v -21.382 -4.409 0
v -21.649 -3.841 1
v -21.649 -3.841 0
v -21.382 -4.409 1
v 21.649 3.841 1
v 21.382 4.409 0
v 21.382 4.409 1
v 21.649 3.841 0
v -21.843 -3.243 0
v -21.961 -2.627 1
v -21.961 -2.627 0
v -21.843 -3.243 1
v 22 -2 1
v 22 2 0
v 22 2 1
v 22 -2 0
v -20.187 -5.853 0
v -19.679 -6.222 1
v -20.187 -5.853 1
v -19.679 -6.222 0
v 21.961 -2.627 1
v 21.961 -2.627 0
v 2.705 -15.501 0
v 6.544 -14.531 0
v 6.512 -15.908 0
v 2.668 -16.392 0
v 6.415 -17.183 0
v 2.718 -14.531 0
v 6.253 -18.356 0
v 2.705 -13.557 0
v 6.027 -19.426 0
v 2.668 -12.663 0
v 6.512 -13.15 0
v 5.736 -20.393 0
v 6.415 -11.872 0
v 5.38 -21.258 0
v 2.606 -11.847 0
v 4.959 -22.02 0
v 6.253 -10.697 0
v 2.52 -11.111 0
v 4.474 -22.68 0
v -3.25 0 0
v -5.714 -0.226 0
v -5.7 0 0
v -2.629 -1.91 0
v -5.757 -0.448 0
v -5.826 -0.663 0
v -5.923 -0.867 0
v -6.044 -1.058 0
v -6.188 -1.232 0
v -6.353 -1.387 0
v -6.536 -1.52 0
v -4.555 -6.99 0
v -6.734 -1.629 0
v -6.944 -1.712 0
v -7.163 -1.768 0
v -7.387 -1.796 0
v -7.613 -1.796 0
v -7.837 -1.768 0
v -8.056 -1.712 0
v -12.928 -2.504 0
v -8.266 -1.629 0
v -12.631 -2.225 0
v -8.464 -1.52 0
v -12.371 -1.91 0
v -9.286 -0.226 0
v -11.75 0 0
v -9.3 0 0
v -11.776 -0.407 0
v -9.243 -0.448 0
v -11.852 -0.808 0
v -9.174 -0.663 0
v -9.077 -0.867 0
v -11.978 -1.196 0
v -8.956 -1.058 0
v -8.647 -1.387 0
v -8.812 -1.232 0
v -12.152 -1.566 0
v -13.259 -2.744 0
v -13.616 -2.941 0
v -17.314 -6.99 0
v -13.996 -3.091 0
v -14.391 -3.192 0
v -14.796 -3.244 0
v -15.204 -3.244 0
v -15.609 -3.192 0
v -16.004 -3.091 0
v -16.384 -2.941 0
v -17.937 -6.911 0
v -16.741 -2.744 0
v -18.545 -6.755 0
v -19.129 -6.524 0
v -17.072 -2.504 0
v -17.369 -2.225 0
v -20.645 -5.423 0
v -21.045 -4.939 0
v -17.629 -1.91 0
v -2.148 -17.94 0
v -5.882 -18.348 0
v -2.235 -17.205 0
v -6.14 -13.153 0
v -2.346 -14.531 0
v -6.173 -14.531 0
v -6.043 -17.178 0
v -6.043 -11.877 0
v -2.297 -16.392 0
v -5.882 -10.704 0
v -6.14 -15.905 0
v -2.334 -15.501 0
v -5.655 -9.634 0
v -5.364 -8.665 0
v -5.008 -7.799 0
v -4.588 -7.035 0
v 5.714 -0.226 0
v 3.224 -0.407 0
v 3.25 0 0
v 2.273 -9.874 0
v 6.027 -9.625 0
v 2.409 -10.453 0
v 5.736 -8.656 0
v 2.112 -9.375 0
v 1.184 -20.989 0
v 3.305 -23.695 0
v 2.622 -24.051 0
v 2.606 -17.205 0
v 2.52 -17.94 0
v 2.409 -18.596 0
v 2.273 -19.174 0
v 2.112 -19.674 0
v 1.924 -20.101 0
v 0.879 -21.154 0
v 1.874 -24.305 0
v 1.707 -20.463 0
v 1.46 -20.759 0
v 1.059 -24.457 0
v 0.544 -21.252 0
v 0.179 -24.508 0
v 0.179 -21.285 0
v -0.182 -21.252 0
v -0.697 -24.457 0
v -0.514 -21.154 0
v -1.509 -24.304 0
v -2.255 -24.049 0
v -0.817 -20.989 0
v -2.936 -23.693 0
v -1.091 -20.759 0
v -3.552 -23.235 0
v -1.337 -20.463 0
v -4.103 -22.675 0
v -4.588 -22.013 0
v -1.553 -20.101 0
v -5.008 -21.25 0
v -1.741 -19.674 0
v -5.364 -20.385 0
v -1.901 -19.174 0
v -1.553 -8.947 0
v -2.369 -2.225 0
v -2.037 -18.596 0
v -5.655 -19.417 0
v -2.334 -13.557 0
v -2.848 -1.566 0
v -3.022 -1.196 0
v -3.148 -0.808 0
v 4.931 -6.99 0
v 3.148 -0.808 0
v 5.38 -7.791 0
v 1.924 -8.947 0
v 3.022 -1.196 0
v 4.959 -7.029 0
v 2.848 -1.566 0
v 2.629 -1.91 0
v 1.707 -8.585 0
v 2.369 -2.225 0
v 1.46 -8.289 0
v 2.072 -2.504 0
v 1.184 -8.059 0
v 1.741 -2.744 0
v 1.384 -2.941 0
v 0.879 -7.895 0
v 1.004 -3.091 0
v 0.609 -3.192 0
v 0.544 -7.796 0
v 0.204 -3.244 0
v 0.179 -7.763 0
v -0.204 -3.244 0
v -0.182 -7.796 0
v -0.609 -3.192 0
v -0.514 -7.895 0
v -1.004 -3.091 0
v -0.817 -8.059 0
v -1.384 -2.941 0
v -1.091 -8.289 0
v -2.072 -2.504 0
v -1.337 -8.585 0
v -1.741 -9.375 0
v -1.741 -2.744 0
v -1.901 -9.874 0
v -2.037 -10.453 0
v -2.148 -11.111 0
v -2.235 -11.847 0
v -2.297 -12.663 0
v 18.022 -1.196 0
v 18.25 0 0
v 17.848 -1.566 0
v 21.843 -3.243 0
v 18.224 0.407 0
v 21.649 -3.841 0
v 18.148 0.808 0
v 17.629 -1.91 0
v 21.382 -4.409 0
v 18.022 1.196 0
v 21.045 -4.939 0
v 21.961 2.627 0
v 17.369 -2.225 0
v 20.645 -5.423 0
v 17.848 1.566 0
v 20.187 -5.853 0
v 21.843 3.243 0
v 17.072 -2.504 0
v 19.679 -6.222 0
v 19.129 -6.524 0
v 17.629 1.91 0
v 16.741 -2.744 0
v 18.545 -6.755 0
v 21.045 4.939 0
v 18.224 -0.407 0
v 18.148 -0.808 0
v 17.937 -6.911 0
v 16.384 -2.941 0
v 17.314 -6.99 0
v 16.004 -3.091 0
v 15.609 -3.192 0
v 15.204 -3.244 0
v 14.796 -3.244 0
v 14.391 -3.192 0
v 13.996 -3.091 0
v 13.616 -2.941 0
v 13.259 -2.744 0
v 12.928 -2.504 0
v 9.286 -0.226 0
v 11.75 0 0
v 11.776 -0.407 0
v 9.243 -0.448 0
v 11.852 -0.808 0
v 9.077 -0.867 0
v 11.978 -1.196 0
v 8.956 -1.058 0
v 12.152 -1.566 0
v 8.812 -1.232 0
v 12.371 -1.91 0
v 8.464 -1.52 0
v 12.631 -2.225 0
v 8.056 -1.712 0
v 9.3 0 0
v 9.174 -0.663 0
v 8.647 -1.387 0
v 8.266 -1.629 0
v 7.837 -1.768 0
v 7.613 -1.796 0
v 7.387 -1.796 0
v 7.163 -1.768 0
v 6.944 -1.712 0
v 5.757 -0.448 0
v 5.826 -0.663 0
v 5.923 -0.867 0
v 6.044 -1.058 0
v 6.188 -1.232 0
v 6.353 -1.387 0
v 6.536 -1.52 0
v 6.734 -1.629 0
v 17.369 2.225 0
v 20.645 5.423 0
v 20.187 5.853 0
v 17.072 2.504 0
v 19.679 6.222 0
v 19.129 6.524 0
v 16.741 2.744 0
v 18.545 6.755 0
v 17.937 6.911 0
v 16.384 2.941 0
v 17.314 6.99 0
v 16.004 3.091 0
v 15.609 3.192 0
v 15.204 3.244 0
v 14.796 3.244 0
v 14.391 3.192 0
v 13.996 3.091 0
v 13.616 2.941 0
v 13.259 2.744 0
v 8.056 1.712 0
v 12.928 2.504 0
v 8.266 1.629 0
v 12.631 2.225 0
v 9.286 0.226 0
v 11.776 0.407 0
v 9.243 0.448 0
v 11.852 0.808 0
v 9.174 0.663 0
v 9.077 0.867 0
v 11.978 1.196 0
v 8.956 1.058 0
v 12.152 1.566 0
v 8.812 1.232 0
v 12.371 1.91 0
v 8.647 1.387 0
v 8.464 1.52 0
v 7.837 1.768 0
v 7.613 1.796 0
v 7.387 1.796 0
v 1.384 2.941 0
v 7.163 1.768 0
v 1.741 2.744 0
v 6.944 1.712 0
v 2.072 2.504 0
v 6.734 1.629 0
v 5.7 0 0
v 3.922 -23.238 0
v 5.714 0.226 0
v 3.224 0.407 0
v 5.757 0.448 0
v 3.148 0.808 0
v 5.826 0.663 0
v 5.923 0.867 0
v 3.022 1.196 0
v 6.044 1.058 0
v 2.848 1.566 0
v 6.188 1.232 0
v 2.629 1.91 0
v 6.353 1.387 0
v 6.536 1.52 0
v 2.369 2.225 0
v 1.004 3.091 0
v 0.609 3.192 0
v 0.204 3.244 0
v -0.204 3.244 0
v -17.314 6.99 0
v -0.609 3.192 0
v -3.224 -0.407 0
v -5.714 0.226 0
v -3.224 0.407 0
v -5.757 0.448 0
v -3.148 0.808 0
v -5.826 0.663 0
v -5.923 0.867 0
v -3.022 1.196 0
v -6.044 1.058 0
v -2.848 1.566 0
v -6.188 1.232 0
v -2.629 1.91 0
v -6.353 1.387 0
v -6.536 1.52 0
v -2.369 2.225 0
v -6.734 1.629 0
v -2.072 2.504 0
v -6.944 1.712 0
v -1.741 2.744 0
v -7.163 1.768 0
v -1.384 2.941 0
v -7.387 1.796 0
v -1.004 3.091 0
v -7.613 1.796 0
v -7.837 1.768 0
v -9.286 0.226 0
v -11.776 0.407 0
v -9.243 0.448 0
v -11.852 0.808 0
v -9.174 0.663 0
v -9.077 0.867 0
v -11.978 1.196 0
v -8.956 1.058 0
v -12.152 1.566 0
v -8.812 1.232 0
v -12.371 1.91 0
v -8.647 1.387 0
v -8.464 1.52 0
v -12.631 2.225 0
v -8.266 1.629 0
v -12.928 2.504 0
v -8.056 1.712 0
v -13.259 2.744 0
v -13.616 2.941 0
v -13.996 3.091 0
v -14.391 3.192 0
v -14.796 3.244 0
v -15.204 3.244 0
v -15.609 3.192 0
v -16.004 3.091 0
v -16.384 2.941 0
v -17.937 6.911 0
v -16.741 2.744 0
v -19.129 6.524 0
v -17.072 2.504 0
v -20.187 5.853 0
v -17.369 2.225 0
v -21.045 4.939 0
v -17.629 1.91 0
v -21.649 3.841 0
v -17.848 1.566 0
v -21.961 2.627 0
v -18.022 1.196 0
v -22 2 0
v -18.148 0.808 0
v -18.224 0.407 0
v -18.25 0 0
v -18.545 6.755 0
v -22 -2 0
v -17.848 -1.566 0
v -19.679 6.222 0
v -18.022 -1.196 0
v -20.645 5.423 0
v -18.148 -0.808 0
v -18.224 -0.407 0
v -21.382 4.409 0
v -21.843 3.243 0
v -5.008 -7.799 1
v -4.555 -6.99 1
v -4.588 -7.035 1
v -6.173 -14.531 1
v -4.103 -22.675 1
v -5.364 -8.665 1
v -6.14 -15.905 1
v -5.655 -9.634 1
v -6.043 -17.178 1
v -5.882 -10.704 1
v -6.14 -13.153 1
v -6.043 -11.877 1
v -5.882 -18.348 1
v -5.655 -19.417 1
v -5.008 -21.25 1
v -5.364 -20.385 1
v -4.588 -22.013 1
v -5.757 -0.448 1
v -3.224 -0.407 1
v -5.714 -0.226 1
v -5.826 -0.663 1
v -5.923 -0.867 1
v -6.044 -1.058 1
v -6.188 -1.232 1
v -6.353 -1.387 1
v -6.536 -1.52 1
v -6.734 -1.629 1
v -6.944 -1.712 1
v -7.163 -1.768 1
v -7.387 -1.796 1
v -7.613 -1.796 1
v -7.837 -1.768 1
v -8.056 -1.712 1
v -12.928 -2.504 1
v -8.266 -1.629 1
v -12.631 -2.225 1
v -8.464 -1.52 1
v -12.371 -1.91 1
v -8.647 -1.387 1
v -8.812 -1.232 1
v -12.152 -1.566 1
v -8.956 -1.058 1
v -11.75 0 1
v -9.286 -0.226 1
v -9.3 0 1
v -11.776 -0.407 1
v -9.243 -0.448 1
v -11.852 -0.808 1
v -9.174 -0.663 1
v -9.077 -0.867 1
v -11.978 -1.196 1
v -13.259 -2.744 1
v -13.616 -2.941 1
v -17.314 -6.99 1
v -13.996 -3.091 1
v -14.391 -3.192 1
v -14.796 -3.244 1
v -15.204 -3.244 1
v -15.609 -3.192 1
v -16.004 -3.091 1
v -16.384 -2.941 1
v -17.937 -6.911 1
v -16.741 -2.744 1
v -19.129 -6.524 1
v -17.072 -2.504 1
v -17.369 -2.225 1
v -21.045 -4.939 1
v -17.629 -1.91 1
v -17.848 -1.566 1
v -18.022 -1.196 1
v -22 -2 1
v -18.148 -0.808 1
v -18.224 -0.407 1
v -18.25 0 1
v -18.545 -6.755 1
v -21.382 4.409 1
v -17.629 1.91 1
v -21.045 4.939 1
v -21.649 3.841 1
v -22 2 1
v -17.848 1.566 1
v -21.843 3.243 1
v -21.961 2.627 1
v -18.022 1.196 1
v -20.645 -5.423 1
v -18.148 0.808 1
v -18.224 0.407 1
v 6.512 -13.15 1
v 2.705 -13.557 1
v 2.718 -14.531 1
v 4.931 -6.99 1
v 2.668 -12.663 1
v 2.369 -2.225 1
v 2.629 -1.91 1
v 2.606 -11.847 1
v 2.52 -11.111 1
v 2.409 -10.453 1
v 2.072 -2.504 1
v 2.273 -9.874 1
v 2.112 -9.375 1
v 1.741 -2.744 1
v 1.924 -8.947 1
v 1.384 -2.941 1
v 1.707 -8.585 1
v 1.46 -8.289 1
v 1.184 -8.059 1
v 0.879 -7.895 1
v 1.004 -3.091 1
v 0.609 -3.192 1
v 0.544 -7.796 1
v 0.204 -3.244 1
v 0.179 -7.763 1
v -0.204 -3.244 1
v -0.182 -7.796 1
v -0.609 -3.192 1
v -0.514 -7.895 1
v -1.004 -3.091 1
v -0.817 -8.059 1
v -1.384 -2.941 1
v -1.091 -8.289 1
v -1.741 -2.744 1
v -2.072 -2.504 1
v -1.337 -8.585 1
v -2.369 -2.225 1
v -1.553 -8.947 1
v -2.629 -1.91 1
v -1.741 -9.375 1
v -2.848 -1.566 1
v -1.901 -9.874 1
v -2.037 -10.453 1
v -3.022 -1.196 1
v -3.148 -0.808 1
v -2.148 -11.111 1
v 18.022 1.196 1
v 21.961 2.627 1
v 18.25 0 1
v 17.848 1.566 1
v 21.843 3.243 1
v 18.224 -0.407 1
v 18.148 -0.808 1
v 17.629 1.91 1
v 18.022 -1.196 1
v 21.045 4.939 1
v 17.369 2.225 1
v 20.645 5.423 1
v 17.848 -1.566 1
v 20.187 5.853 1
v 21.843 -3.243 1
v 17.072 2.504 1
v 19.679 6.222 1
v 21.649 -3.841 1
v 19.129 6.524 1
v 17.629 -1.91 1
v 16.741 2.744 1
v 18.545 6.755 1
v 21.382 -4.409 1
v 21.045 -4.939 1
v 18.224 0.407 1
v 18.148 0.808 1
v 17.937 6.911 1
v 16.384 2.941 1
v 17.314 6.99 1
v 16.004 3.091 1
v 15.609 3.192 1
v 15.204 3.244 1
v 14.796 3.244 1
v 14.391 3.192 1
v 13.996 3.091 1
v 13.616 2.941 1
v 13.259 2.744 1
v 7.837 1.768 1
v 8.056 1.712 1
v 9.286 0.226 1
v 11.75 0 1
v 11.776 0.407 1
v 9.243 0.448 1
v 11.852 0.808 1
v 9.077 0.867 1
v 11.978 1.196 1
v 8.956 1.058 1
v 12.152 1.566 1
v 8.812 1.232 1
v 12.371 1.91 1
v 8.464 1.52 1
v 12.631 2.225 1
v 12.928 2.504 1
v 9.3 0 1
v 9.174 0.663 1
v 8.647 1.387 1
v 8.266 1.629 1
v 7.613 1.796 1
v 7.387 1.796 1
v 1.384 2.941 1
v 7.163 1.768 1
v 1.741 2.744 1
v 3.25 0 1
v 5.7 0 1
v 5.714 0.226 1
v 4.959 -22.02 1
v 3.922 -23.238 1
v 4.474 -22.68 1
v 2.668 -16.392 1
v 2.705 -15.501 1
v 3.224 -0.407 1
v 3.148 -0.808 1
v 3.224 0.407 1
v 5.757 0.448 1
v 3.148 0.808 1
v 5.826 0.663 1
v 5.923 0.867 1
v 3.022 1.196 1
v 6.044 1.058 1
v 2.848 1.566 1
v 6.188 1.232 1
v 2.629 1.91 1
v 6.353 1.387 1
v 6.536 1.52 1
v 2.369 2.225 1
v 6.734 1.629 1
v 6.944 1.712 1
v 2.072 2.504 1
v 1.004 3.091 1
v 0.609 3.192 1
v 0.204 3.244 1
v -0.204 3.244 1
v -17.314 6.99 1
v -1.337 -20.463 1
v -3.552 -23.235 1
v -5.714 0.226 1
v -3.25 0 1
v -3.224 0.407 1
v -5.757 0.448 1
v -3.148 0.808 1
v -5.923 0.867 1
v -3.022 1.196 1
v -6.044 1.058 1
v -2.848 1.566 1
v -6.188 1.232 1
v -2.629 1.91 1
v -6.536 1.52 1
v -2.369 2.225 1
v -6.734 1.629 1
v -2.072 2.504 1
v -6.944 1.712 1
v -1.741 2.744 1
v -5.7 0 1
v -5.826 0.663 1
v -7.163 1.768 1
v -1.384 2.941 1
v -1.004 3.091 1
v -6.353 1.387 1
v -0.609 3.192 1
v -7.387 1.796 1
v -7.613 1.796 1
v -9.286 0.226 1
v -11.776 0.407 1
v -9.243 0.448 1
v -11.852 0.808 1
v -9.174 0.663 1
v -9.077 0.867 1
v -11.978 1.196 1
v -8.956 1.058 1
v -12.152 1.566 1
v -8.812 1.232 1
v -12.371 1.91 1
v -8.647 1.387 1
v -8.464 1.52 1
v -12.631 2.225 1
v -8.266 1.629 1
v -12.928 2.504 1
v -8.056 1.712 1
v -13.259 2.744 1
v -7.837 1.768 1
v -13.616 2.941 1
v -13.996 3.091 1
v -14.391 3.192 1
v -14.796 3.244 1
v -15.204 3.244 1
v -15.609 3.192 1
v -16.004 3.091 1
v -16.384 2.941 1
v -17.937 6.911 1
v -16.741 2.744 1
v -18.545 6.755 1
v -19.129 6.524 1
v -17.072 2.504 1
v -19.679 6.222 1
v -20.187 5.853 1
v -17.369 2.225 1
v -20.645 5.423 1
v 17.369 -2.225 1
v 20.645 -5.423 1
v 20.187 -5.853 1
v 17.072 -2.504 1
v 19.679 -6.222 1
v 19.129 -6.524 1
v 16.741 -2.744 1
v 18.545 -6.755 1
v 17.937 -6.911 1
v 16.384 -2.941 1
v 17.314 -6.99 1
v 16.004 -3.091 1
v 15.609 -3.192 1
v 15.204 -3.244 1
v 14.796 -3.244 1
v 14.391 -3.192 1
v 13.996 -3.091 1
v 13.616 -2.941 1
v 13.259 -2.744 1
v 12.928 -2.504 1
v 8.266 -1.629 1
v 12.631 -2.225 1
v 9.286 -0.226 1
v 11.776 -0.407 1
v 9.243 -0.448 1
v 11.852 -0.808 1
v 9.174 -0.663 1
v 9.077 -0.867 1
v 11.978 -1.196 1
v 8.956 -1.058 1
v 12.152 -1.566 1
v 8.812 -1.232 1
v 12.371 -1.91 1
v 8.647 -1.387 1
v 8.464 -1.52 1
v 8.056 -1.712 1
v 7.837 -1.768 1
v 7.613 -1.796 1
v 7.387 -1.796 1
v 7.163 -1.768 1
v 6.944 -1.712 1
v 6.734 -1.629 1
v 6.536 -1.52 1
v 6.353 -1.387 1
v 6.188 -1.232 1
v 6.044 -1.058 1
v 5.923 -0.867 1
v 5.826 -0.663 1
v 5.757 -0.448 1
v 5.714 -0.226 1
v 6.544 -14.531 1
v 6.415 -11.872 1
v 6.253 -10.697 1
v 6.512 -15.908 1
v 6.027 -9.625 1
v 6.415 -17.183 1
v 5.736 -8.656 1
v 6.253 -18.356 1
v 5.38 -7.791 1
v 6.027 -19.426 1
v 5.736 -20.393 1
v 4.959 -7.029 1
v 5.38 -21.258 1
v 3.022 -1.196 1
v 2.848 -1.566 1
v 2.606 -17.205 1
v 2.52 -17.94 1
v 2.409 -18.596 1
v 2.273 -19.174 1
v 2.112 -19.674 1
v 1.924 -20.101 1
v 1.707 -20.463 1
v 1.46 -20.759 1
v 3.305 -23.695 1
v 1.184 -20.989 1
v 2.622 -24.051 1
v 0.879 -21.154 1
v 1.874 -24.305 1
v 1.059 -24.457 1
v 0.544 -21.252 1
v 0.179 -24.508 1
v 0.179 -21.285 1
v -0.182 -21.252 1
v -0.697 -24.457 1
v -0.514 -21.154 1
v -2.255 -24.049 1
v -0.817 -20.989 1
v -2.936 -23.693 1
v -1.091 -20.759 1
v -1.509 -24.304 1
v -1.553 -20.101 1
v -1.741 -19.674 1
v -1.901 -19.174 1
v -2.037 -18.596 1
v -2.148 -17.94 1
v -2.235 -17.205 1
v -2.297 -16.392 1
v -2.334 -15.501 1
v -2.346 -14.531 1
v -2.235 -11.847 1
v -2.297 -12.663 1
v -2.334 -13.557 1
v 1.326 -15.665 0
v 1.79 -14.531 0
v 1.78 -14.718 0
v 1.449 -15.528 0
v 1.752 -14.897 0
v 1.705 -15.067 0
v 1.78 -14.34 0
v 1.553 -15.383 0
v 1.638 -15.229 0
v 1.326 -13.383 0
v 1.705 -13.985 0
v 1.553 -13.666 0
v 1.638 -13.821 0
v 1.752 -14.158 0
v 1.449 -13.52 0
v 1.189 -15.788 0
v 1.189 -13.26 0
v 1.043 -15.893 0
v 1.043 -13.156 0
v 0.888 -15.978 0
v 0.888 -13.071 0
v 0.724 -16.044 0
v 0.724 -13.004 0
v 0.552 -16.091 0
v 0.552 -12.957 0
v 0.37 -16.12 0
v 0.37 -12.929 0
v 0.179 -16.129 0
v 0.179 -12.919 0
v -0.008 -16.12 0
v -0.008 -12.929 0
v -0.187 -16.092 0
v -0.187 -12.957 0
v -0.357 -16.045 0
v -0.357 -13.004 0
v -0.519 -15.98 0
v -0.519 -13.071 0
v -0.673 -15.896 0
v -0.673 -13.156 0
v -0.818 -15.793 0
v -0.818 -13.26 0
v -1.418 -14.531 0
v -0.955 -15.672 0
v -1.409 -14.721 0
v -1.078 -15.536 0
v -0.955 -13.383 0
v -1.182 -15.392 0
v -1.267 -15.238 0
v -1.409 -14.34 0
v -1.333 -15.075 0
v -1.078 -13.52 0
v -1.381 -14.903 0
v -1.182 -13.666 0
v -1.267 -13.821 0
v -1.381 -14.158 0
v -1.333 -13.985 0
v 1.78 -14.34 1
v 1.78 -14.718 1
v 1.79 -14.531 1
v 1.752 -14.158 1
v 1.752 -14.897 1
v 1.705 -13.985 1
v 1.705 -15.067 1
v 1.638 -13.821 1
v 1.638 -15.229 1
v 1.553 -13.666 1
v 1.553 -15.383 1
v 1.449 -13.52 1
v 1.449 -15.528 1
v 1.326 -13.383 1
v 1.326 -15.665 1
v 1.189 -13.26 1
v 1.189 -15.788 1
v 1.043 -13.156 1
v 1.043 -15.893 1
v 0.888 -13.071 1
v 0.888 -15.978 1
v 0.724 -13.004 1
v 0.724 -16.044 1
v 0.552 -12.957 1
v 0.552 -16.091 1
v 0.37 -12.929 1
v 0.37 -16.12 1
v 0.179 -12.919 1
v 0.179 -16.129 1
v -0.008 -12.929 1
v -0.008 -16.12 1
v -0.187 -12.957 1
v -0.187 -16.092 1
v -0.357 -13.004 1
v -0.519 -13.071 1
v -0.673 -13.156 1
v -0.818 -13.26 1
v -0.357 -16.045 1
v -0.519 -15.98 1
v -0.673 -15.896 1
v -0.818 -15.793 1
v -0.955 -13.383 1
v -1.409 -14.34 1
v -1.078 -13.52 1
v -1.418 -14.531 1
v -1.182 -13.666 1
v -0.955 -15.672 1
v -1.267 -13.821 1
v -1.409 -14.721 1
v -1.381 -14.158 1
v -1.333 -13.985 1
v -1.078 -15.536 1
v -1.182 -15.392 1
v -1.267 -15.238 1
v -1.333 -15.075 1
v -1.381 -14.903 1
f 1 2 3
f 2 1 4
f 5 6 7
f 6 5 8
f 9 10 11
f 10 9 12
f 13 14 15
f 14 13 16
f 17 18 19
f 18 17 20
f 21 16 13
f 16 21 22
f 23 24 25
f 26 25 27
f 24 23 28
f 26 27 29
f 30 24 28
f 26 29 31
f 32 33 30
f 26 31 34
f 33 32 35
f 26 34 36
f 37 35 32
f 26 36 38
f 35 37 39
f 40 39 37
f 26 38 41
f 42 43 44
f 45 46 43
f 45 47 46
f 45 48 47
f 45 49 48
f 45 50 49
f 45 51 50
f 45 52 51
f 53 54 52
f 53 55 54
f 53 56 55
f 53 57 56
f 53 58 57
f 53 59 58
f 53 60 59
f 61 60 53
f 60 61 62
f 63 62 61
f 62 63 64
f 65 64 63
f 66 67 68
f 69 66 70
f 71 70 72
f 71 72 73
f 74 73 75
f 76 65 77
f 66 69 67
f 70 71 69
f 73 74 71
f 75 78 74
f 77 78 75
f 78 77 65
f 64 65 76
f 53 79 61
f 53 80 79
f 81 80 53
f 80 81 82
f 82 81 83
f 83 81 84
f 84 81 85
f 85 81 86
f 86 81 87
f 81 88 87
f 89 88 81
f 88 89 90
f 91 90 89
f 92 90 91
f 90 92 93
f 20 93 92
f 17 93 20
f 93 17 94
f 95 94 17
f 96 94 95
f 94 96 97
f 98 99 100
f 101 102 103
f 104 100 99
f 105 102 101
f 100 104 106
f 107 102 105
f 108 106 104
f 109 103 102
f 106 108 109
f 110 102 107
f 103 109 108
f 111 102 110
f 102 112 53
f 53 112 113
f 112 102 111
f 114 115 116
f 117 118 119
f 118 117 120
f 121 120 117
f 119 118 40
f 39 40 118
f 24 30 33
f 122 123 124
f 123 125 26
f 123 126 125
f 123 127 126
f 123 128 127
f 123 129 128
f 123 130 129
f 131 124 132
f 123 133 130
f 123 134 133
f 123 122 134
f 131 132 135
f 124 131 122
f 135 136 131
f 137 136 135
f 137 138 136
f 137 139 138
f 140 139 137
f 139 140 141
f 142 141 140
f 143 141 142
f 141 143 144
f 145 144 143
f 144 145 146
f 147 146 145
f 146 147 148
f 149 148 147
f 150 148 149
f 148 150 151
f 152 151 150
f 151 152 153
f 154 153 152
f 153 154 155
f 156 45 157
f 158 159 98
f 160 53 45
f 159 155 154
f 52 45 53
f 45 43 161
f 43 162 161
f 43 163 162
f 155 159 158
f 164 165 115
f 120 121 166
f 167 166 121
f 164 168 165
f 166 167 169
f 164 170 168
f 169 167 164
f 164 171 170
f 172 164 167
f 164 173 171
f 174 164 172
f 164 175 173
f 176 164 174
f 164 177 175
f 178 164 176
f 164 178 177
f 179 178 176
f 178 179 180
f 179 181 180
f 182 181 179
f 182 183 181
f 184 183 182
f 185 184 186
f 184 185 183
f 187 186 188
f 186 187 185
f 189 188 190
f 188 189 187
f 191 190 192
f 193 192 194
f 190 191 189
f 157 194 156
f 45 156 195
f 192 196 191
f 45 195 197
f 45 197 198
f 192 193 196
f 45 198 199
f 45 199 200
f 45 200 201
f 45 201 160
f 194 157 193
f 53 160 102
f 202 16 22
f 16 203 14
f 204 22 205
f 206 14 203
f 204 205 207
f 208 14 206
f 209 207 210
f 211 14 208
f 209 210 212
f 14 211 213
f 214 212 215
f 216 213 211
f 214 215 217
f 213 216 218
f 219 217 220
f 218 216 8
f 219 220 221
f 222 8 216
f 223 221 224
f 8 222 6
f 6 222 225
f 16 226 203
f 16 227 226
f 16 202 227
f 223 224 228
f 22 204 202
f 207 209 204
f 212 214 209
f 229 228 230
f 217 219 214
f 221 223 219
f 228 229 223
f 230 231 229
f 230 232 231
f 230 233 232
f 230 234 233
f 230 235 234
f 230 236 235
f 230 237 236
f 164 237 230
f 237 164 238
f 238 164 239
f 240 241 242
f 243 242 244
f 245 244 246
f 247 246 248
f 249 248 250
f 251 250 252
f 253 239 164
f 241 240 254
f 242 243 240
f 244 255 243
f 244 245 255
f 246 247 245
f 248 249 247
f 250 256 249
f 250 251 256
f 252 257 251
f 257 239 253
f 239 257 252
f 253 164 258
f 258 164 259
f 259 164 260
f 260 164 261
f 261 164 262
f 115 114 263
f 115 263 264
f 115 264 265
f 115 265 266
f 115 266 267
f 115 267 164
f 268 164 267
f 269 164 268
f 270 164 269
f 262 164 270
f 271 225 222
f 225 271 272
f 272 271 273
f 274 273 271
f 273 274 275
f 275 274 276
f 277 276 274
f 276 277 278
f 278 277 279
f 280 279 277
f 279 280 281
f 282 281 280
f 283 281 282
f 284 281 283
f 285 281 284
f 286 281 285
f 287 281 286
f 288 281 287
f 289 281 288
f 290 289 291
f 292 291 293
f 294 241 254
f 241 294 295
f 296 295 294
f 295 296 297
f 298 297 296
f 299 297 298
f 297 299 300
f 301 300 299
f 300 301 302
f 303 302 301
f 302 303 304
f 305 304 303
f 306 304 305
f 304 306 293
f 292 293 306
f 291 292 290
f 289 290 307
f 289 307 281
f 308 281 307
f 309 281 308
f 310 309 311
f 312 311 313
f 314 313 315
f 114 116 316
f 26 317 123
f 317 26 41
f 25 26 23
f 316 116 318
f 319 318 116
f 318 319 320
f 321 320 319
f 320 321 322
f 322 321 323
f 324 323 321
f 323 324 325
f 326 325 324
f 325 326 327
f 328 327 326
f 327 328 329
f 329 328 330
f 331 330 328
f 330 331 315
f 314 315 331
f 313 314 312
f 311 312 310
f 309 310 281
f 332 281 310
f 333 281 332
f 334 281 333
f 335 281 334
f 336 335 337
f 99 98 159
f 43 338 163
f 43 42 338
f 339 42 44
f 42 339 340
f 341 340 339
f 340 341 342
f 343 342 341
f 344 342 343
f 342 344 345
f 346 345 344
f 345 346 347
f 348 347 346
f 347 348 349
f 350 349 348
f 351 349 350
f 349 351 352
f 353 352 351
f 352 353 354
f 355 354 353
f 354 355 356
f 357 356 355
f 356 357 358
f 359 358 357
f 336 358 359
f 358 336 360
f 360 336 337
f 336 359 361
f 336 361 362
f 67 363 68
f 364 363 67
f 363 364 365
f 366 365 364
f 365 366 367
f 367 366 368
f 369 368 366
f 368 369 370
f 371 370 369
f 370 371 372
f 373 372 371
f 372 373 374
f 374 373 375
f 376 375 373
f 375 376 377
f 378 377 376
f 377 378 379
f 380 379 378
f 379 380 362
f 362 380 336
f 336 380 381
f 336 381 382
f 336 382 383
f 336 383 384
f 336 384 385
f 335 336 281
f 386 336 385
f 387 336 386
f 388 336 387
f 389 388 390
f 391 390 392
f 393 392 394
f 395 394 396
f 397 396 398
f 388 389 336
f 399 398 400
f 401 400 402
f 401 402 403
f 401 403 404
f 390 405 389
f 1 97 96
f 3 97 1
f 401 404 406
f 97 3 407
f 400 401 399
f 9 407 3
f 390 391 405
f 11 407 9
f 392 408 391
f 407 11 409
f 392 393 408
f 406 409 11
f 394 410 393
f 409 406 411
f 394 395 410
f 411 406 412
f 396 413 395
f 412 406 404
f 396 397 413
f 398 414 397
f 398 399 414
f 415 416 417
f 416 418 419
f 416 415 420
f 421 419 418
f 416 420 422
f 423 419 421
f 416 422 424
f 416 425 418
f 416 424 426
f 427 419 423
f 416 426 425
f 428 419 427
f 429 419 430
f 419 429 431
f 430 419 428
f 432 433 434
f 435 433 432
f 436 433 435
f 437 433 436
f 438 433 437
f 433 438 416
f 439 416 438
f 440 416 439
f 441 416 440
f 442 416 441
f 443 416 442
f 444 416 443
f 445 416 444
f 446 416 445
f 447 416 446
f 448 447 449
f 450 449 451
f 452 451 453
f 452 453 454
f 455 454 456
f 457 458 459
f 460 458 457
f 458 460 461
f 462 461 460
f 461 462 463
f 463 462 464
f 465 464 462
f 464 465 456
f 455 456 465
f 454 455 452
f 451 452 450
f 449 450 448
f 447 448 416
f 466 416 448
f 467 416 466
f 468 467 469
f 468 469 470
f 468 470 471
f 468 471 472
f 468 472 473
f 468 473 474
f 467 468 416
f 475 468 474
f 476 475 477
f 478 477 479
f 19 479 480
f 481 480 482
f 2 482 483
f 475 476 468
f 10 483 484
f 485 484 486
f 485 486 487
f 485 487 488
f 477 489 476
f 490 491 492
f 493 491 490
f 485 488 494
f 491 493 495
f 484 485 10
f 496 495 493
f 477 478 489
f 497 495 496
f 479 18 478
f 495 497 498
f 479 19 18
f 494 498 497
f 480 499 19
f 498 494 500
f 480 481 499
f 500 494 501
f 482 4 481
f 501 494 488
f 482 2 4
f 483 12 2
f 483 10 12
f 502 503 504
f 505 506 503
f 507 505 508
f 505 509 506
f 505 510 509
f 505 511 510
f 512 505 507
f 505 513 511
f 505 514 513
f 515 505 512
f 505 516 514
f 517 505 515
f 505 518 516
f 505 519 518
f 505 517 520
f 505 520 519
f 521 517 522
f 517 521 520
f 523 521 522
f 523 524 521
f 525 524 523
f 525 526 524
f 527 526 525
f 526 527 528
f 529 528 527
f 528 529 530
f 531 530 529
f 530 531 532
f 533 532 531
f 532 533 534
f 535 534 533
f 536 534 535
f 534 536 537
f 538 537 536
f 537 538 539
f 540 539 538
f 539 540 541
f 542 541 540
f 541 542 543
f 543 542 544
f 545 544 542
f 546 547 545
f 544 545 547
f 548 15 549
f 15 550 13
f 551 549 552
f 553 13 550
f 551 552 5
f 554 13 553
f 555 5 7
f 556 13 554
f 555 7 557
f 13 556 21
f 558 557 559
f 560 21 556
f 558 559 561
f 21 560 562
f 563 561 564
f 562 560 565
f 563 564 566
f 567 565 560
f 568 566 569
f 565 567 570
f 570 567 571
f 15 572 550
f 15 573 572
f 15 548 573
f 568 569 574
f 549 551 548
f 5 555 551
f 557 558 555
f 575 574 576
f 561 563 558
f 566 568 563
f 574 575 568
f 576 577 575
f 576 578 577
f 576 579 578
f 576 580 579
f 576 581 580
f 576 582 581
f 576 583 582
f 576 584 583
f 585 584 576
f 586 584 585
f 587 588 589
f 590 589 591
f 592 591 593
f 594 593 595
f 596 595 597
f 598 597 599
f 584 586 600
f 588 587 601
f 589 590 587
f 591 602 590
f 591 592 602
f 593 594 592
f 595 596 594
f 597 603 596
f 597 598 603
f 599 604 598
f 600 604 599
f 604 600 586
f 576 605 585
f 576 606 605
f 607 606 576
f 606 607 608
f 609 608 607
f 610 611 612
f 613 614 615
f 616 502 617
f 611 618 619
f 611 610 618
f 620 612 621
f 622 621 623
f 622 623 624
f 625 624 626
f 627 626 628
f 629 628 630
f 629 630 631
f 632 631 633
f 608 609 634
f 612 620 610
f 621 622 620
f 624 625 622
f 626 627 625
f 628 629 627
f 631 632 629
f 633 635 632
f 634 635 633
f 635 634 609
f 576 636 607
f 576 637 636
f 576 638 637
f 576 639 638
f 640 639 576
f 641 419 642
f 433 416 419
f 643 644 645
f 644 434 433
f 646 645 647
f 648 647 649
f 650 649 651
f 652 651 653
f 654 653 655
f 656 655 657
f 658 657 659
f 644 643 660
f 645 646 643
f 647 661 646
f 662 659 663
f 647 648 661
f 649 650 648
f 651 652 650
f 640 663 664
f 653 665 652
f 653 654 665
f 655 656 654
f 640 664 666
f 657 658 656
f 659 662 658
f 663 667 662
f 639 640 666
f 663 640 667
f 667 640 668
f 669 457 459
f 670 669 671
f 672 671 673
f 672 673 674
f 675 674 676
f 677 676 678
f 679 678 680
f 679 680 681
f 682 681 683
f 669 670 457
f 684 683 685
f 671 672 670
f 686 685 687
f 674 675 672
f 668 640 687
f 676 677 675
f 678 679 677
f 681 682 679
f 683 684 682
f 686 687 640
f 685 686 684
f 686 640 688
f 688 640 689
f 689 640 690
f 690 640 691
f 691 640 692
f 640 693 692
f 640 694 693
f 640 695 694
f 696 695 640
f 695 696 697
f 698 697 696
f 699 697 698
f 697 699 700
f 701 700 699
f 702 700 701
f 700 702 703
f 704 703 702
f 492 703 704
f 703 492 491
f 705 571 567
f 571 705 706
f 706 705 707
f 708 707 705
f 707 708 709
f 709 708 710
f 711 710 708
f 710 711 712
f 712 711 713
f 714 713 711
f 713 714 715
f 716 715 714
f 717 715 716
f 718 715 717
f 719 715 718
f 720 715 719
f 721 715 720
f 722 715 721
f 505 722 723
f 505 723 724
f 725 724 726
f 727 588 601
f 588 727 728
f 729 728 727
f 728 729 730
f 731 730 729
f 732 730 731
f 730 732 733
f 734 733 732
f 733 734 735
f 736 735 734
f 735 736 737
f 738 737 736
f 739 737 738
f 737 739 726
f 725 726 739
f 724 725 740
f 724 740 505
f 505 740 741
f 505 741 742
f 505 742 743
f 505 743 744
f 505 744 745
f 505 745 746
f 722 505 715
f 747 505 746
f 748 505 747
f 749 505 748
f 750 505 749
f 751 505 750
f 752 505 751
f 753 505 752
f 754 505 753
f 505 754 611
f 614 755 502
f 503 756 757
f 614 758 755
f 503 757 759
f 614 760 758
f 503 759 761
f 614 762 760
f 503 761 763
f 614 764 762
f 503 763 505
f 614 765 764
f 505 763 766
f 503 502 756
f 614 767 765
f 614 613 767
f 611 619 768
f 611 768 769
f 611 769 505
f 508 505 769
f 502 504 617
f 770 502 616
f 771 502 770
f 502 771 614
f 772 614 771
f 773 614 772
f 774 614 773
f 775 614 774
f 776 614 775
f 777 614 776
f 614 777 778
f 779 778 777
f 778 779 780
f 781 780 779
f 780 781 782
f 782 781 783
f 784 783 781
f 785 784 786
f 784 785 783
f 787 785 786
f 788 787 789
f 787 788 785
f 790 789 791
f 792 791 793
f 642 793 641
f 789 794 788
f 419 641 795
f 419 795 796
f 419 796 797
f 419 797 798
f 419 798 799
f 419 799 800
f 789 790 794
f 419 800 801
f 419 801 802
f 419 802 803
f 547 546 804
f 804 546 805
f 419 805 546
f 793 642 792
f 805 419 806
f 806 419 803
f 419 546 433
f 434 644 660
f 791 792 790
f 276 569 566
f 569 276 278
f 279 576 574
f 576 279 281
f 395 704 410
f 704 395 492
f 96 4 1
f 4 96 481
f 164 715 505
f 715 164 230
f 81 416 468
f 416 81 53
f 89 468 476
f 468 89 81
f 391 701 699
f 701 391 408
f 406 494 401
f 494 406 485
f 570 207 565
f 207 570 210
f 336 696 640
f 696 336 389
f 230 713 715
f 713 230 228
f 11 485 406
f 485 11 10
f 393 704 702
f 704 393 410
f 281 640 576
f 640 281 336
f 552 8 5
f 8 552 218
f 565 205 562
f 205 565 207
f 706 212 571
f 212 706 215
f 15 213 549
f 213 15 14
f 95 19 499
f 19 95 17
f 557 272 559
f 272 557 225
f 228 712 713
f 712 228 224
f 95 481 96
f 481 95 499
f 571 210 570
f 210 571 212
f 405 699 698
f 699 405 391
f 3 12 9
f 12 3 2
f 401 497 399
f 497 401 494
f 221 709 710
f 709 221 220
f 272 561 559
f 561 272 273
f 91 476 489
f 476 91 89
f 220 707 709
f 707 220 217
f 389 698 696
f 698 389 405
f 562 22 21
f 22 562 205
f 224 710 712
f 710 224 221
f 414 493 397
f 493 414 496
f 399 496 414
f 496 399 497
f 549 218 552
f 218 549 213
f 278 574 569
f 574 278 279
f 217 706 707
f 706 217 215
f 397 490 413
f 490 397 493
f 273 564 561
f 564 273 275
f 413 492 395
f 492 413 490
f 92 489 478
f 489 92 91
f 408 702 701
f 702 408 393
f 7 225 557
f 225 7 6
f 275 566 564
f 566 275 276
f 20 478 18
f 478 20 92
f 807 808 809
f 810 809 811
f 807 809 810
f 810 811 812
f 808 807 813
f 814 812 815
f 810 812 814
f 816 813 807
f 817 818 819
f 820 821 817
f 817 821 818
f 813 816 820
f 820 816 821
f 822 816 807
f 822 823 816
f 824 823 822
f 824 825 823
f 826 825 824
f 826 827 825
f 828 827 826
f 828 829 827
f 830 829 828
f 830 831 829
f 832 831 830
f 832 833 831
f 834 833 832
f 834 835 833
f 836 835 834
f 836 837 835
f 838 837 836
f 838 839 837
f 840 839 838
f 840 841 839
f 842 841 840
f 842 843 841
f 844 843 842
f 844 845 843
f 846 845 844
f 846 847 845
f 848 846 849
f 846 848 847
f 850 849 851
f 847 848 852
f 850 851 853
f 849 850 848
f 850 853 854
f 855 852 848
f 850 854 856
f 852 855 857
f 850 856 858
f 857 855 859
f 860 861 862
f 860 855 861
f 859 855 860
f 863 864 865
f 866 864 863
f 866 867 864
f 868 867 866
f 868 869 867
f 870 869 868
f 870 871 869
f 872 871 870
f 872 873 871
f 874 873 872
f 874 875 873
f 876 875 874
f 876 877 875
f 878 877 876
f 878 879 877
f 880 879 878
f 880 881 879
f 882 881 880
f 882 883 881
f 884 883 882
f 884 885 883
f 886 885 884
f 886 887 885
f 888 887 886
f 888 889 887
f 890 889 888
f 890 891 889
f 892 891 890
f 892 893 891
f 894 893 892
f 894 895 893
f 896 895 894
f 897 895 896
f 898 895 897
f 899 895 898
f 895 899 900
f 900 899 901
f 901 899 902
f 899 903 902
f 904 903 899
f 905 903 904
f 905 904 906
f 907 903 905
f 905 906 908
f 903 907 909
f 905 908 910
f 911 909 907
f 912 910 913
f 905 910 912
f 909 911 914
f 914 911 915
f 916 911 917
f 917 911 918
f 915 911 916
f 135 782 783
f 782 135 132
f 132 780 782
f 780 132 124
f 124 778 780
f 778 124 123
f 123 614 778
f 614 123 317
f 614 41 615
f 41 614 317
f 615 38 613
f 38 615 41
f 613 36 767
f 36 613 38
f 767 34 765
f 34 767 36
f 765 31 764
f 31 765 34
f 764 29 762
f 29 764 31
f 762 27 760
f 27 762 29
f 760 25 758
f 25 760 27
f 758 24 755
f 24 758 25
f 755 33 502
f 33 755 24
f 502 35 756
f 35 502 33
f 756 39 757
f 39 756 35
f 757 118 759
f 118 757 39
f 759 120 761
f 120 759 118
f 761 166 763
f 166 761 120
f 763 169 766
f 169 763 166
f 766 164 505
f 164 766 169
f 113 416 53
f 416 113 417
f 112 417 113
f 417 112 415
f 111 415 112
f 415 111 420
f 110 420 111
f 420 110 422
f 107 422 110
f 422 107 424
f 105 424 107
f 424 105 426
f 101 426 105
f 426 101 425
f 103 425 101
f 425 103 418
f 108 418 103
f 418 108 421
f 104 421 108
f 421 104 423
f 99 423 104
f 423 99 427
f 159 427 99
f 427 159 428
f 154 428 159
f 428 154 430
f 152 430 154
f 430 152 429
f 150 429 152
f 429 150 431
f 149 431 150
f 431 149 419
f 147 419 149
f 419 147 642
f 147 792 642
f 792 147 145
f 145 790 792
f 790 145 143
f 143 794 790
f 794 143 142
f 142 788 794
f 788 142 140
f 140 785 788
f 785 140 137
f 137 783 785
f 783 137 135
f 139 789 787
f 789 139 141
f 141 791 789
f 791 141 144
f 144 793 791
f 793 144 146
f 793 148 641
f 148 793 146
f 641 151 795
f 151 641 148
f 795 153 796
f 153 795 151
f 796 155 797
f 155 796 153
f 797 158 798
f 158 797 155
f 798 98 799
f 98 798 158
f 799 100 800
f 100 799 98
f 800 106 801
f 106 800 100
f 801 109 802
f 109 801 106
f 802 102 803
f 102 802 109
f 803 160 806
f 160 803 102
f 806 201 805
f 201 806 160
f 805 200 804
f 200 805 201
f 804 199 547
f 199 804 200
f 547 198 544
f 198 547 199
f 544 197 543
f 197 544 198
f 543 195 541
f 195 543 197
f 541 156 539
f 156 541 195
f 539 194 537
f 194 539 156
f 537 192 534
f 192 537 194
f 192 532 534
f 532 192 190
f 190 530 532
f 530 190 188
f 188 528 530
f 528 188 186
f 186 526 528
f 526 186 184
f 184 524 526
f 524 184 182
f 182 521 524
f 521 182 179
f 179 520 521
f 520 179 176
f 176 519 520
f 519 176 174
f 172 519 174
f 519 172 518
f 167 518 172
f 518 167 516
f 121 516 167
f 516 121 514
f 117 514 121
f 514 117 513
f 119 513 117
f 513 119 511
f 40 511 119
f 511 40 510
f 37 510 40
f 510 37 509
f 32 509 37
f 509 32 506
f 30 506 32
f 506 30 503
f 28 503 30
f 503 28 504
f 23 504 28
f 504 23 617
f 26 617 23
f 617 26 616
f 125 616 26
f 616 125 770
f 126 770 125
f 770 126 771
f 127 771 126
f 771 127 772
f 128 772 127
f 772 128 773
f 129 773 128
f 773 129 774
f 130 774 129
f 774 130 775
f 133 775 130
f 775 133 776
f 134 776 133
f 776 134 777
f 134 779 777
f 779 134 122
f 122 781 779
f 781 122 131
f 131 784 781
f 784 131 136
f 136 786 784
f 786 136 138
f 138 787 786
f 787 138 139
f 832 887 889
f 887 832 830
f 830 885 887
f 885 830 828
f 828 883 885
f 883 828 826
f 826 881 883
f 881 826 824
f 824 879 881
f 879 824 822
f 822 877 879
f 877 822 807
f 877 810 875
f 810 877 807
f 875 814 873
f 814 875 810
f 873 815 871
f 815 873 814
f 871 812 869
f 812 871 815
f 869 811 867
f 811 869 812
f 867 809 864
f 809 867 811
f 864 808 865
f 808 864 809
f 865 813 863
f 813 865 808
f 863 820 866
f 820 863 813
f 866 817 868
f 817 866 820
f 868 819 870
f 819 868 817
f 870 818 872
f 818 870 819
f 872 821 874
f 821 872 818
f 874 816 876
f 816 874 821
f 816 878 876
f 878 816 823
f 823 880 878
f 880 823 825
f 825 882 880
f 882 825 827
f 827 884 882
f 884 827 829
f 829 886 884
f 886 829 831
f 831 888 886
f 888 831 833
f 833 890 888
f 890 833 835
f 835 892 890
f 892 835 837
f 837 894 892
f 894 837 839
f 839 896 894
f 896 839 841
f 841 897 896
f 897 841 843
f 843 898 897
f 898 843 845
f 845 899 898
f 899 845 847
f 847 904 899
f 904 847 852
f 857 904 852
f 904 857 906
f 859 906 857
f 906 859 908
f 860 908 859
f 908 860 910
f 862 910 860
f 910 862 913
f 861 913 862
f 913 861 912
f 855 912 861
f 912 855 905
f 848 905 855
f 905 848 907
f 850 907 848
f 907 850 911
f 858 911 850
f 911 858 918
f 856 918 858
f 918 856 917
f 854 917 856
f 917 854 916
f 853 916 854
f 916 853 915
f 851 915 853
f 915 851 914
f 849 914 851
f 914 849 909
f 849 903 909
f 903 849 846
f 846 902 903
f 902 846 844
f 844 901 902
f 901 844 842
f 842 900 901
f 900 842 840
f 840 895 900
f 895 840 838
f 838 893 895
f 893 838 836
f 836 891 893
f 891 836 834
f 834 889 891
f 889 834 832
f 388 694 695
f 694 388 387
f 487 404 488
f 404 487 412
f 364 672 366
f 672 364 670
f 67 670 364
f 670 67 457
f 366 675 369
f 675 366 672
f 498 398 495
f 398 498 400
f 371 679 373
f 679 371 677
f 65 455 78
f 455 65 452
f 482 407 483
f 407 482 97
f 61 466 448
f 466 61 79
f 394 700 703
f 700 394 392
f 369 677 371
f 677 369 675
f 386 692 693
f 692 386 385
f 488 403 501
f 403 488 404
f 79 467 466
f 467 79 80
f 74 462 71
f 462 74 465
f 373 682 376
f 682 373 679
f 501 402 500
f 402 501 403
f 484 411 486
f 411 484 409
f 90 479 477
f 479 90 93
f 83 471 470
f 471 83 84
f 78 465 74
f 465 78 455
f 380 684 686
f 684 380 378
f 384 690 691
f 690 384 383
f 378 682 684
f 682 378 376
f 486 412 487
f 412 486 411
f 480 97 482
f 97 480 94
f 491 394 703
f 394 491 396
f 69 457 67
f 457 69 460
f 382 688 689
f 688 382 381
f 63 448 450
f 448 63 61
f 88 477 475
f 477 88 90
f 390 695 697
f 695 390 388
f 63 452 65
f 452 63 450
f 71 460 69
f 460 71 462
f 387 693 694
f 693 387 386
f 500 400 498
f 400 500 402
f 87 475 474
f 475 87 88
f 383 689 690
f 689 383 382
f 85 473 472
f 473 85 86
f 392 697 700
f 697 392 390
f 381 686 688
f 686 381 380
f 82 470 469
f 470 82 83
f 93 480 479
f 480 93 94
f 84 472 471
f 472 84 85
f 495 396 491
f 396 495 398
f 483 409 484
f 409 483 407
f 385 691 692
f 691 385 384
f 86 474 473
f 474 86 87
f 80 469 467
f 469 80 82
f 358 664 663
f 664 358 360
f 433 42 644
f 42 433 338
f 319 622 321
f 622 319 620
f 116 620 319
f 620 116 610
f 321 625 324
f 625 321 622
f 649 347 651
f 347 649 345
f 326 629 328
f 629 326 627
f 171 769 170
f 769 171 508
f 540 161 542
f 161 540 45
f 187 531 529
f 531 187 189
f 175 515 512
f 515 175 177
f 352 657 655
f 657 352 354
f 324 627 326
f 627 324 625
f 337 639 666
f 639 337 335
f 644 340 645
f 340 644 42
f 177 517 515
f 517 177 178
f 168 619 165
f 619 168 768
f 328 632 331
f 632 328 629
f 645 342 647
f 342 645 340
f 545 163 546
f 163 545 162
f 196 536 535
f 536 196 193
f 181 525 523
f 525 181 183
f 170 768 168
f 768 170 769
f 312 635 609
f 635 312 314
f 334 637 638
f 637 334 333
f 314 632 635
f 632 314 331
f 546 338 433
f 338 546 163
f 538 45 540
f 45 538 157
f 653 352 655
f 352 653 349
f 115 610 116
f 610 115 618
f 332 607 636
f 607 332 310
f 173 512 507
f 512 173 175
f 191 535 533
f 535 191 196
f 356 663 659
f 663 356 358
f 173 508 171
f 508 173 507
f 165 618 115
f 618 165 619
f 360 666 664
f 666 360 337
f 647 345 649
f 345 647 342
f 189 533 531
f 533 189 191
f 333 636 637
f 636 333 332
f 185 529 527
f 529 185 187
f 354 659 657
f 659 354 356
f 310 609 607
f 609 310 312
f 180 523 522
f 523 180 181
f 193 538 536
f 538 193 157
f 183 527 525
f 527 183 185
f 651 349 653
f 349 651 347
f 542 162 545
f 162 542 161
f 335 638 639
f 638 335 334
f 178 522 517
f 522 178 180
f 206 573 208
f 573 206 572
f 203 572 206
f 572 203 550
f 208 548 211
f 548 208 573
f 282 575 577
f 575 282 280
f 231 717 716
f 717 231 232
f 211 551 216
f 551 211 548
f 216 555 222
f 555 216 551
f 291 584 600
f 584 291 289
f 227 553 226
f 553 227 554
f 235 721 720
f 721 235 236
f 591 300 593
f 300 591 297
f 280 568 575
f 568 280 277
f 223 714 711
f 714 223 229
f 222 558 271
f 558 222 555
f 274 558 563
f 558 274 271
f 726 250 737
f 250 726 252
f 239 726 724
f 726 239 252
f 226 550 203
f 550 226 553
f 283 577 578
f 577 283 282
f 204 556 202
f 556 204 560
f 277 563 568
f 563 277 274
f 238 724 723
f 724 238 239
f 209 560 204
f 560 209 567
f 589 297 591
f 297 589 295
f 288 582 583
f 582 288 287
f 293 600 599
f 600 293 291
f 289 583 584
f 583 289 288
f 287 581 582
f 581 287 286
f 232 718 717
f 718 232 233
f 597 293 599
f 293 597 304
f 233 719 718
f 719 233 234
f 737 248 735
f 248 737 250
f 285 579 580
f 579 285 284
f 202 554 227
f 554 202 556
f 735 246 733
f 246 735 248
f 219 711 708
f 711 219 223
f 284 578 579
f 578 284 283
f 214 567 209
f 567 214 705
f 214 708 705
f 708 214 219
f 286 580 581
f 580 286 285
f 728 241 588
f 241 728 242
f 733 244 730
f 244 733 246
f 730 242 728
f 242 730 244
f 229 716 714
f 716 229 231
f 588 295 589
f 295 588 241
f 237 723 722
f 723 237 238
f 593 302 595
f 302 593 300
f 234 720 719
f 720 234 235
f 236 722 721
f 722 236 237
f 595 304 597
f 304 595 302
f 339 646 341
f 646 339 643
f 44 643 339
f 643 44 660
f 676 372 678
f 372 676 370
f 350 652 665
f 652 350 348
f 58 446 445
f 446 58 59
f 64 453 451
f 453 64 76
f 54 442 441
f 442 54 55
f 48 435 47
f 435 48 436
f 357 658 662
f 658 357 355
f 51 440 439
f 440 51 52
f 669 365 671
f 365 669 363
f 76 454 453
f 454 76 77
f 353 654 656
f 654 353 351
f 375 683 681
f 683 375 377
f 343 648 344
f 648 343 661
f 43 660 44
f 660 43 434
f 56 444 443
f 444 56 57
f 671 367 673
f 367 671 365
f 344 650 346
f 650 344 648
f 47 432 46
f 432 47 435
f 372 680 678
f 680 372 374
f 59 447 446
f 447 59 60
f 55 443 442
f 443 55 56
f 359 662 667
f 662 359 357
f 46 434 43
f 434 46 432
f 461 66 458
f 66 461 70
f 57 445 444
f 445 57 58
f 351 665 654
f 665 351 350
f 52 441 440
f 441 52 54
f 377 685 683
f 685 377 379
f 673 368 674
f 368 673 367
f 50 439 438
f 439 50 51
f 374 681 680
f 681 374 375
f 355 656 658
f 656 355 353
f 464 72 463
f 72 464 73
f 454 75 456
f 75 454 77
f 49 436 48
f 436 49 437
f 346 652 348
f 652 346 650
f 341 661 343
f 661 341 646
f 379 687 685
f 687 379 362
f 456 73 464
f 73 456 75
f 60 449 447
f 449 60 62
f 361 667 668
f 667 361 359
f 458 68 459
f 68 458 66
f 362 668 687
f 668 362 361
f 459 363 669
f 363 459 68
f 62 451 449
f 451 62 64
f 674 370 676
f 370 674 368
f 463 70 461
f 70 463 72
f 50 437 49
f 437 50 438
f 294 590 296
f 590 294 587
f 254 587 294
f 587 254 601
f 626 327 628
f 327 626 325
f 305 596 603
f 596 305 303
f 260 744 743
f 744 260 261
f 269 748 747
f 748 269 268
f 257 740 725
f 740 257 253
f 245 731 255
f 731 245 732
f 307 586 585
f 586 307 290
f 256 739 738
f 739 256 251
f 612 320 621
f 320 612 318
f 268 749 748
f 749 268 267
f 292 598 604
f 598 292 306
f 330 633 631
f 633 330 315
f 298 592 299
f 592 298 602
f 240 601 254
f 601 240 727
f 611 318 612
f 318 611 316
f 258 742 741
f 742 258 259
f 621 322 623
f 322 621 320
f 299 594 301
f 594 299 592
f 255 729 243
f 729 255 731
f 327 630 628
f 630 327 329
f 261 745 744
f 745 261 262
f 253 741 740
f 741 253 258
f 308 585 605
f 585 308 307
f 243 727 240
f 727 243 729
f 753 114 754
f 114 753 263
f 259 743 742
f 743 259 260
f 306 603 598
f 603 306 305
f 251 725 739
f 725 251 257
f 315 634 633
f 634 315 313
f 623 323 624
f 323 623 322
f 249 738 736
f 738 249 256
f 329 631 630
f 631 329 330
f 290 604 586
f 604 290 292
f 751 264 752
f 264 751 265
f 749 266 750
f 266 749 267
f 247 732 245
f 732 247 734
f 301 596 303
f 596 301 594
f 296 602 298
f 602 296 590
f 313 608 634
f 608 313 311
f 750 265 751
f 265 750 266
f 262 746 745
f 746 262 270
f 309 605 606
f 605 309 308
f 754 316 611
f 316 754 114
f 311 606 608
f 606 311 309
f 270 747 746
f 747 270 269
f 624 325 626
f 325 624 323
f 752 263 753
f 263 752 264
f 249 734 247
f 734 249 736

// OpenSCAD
$fn = 50;


difference() {
	union() {
		*color(alpha = 1.0000000000, c = "gray") {
			translate(v = [0, 14, 0]) {
				linear_extrude(height = 1) {
					text(font = "Arial:style=Bold", halign = "center", size = 4.5000000000, text = "COMMENT description oobb_plate_shape_p_type_1_depth_3_width_1_thickness_0_extra_oobb_size", valign = "center");
				}
			}
		}
		hull() {
			translate(v = [-17.0000000000, 2.0000000000, 0]) {
				cylinder(h = 1, r = 5);
			}
			translate(v = [17.0000000000, 2.0000000000, 0]) {
				cylinder(h = 1, r = 5);
			}
			translate(v = [-17.0000000000, -2.0000000000, 0]) {
				cylinder(h = 1, r = 5);
			}
			translate(v = [17.0000000000, -2.0000000000, 0]) {
				cylinder(h = 1, r = 5);
			}
		}
		translate(v = [0, -5, 0]) {
			linear_extrude(height = 1) {
				text(font = "DejaVu Sans Mono:style=Bold", halign = "center", size = 19.0000000000, text = "0", valign = "top");
			}
		}
	}
	union() {
		*color(alpha = 1.0000000000, c = "gray") {
			translate(v = [0, 14, 0]) {
				linear_extrude(height = 1) {
					text(font = "Arial:style=Bold", halign = "center", size = 4.5000000000, text = "COMMENT description oobb_holes_shape_n_type_3_width_1_thickness_0_extra_oobb_size_1_height_'all'_holes_true_both_holes", valign = "center");
				}
			}
		}
		translate(v = [-15.0000000000, 0.0000000000, 0]) {
			translate(v = [0, 0, -50]) {
				cylinder(h = 100, r = 3.2500000000);
			}
		}
		translate(v = [0, 0, -50]) {
			cylinder(h = 100, r = 3.2500000000);
		}
		translate(v = [15.0000000000, 0.0000000000, 0]) {
			translate(v = [0, 0, -50]) {
				cylinder(h = 100, r = 3.2500000000);
			}
		}
		translate(v = [-15.0000000000, 0.0000000000, 0]) {
			translate(v = [0, 0, -50]) {
				cylinder(h = 100, r = 1.8000000000);
			}
		}
		translate(v = [-7.5000000000, 0.0000000000, 0]) {
			translate(v = [0, 0, -50]) {
				cylinder(h = 100, r = 1.8000000000);
			}
		}
		translate(v = [0, 0, -50]) {
			cylinder(h = 100, r = 1.8000000000);
		}
		translate(v = [7.5000000000, 0.0000000000, 0]) {
			translate(v = [0, 0, -50]) {
				cylinder(h = 100, r = 1.8000000000);
			}
		}
		translate(v = [15.0000000000, 0.0000000000, 0]) {
			translate(v = [0, 0, -50]) {
				cylinder(h = 100, r = 1.8000000000);
			}
		}
	}
}
